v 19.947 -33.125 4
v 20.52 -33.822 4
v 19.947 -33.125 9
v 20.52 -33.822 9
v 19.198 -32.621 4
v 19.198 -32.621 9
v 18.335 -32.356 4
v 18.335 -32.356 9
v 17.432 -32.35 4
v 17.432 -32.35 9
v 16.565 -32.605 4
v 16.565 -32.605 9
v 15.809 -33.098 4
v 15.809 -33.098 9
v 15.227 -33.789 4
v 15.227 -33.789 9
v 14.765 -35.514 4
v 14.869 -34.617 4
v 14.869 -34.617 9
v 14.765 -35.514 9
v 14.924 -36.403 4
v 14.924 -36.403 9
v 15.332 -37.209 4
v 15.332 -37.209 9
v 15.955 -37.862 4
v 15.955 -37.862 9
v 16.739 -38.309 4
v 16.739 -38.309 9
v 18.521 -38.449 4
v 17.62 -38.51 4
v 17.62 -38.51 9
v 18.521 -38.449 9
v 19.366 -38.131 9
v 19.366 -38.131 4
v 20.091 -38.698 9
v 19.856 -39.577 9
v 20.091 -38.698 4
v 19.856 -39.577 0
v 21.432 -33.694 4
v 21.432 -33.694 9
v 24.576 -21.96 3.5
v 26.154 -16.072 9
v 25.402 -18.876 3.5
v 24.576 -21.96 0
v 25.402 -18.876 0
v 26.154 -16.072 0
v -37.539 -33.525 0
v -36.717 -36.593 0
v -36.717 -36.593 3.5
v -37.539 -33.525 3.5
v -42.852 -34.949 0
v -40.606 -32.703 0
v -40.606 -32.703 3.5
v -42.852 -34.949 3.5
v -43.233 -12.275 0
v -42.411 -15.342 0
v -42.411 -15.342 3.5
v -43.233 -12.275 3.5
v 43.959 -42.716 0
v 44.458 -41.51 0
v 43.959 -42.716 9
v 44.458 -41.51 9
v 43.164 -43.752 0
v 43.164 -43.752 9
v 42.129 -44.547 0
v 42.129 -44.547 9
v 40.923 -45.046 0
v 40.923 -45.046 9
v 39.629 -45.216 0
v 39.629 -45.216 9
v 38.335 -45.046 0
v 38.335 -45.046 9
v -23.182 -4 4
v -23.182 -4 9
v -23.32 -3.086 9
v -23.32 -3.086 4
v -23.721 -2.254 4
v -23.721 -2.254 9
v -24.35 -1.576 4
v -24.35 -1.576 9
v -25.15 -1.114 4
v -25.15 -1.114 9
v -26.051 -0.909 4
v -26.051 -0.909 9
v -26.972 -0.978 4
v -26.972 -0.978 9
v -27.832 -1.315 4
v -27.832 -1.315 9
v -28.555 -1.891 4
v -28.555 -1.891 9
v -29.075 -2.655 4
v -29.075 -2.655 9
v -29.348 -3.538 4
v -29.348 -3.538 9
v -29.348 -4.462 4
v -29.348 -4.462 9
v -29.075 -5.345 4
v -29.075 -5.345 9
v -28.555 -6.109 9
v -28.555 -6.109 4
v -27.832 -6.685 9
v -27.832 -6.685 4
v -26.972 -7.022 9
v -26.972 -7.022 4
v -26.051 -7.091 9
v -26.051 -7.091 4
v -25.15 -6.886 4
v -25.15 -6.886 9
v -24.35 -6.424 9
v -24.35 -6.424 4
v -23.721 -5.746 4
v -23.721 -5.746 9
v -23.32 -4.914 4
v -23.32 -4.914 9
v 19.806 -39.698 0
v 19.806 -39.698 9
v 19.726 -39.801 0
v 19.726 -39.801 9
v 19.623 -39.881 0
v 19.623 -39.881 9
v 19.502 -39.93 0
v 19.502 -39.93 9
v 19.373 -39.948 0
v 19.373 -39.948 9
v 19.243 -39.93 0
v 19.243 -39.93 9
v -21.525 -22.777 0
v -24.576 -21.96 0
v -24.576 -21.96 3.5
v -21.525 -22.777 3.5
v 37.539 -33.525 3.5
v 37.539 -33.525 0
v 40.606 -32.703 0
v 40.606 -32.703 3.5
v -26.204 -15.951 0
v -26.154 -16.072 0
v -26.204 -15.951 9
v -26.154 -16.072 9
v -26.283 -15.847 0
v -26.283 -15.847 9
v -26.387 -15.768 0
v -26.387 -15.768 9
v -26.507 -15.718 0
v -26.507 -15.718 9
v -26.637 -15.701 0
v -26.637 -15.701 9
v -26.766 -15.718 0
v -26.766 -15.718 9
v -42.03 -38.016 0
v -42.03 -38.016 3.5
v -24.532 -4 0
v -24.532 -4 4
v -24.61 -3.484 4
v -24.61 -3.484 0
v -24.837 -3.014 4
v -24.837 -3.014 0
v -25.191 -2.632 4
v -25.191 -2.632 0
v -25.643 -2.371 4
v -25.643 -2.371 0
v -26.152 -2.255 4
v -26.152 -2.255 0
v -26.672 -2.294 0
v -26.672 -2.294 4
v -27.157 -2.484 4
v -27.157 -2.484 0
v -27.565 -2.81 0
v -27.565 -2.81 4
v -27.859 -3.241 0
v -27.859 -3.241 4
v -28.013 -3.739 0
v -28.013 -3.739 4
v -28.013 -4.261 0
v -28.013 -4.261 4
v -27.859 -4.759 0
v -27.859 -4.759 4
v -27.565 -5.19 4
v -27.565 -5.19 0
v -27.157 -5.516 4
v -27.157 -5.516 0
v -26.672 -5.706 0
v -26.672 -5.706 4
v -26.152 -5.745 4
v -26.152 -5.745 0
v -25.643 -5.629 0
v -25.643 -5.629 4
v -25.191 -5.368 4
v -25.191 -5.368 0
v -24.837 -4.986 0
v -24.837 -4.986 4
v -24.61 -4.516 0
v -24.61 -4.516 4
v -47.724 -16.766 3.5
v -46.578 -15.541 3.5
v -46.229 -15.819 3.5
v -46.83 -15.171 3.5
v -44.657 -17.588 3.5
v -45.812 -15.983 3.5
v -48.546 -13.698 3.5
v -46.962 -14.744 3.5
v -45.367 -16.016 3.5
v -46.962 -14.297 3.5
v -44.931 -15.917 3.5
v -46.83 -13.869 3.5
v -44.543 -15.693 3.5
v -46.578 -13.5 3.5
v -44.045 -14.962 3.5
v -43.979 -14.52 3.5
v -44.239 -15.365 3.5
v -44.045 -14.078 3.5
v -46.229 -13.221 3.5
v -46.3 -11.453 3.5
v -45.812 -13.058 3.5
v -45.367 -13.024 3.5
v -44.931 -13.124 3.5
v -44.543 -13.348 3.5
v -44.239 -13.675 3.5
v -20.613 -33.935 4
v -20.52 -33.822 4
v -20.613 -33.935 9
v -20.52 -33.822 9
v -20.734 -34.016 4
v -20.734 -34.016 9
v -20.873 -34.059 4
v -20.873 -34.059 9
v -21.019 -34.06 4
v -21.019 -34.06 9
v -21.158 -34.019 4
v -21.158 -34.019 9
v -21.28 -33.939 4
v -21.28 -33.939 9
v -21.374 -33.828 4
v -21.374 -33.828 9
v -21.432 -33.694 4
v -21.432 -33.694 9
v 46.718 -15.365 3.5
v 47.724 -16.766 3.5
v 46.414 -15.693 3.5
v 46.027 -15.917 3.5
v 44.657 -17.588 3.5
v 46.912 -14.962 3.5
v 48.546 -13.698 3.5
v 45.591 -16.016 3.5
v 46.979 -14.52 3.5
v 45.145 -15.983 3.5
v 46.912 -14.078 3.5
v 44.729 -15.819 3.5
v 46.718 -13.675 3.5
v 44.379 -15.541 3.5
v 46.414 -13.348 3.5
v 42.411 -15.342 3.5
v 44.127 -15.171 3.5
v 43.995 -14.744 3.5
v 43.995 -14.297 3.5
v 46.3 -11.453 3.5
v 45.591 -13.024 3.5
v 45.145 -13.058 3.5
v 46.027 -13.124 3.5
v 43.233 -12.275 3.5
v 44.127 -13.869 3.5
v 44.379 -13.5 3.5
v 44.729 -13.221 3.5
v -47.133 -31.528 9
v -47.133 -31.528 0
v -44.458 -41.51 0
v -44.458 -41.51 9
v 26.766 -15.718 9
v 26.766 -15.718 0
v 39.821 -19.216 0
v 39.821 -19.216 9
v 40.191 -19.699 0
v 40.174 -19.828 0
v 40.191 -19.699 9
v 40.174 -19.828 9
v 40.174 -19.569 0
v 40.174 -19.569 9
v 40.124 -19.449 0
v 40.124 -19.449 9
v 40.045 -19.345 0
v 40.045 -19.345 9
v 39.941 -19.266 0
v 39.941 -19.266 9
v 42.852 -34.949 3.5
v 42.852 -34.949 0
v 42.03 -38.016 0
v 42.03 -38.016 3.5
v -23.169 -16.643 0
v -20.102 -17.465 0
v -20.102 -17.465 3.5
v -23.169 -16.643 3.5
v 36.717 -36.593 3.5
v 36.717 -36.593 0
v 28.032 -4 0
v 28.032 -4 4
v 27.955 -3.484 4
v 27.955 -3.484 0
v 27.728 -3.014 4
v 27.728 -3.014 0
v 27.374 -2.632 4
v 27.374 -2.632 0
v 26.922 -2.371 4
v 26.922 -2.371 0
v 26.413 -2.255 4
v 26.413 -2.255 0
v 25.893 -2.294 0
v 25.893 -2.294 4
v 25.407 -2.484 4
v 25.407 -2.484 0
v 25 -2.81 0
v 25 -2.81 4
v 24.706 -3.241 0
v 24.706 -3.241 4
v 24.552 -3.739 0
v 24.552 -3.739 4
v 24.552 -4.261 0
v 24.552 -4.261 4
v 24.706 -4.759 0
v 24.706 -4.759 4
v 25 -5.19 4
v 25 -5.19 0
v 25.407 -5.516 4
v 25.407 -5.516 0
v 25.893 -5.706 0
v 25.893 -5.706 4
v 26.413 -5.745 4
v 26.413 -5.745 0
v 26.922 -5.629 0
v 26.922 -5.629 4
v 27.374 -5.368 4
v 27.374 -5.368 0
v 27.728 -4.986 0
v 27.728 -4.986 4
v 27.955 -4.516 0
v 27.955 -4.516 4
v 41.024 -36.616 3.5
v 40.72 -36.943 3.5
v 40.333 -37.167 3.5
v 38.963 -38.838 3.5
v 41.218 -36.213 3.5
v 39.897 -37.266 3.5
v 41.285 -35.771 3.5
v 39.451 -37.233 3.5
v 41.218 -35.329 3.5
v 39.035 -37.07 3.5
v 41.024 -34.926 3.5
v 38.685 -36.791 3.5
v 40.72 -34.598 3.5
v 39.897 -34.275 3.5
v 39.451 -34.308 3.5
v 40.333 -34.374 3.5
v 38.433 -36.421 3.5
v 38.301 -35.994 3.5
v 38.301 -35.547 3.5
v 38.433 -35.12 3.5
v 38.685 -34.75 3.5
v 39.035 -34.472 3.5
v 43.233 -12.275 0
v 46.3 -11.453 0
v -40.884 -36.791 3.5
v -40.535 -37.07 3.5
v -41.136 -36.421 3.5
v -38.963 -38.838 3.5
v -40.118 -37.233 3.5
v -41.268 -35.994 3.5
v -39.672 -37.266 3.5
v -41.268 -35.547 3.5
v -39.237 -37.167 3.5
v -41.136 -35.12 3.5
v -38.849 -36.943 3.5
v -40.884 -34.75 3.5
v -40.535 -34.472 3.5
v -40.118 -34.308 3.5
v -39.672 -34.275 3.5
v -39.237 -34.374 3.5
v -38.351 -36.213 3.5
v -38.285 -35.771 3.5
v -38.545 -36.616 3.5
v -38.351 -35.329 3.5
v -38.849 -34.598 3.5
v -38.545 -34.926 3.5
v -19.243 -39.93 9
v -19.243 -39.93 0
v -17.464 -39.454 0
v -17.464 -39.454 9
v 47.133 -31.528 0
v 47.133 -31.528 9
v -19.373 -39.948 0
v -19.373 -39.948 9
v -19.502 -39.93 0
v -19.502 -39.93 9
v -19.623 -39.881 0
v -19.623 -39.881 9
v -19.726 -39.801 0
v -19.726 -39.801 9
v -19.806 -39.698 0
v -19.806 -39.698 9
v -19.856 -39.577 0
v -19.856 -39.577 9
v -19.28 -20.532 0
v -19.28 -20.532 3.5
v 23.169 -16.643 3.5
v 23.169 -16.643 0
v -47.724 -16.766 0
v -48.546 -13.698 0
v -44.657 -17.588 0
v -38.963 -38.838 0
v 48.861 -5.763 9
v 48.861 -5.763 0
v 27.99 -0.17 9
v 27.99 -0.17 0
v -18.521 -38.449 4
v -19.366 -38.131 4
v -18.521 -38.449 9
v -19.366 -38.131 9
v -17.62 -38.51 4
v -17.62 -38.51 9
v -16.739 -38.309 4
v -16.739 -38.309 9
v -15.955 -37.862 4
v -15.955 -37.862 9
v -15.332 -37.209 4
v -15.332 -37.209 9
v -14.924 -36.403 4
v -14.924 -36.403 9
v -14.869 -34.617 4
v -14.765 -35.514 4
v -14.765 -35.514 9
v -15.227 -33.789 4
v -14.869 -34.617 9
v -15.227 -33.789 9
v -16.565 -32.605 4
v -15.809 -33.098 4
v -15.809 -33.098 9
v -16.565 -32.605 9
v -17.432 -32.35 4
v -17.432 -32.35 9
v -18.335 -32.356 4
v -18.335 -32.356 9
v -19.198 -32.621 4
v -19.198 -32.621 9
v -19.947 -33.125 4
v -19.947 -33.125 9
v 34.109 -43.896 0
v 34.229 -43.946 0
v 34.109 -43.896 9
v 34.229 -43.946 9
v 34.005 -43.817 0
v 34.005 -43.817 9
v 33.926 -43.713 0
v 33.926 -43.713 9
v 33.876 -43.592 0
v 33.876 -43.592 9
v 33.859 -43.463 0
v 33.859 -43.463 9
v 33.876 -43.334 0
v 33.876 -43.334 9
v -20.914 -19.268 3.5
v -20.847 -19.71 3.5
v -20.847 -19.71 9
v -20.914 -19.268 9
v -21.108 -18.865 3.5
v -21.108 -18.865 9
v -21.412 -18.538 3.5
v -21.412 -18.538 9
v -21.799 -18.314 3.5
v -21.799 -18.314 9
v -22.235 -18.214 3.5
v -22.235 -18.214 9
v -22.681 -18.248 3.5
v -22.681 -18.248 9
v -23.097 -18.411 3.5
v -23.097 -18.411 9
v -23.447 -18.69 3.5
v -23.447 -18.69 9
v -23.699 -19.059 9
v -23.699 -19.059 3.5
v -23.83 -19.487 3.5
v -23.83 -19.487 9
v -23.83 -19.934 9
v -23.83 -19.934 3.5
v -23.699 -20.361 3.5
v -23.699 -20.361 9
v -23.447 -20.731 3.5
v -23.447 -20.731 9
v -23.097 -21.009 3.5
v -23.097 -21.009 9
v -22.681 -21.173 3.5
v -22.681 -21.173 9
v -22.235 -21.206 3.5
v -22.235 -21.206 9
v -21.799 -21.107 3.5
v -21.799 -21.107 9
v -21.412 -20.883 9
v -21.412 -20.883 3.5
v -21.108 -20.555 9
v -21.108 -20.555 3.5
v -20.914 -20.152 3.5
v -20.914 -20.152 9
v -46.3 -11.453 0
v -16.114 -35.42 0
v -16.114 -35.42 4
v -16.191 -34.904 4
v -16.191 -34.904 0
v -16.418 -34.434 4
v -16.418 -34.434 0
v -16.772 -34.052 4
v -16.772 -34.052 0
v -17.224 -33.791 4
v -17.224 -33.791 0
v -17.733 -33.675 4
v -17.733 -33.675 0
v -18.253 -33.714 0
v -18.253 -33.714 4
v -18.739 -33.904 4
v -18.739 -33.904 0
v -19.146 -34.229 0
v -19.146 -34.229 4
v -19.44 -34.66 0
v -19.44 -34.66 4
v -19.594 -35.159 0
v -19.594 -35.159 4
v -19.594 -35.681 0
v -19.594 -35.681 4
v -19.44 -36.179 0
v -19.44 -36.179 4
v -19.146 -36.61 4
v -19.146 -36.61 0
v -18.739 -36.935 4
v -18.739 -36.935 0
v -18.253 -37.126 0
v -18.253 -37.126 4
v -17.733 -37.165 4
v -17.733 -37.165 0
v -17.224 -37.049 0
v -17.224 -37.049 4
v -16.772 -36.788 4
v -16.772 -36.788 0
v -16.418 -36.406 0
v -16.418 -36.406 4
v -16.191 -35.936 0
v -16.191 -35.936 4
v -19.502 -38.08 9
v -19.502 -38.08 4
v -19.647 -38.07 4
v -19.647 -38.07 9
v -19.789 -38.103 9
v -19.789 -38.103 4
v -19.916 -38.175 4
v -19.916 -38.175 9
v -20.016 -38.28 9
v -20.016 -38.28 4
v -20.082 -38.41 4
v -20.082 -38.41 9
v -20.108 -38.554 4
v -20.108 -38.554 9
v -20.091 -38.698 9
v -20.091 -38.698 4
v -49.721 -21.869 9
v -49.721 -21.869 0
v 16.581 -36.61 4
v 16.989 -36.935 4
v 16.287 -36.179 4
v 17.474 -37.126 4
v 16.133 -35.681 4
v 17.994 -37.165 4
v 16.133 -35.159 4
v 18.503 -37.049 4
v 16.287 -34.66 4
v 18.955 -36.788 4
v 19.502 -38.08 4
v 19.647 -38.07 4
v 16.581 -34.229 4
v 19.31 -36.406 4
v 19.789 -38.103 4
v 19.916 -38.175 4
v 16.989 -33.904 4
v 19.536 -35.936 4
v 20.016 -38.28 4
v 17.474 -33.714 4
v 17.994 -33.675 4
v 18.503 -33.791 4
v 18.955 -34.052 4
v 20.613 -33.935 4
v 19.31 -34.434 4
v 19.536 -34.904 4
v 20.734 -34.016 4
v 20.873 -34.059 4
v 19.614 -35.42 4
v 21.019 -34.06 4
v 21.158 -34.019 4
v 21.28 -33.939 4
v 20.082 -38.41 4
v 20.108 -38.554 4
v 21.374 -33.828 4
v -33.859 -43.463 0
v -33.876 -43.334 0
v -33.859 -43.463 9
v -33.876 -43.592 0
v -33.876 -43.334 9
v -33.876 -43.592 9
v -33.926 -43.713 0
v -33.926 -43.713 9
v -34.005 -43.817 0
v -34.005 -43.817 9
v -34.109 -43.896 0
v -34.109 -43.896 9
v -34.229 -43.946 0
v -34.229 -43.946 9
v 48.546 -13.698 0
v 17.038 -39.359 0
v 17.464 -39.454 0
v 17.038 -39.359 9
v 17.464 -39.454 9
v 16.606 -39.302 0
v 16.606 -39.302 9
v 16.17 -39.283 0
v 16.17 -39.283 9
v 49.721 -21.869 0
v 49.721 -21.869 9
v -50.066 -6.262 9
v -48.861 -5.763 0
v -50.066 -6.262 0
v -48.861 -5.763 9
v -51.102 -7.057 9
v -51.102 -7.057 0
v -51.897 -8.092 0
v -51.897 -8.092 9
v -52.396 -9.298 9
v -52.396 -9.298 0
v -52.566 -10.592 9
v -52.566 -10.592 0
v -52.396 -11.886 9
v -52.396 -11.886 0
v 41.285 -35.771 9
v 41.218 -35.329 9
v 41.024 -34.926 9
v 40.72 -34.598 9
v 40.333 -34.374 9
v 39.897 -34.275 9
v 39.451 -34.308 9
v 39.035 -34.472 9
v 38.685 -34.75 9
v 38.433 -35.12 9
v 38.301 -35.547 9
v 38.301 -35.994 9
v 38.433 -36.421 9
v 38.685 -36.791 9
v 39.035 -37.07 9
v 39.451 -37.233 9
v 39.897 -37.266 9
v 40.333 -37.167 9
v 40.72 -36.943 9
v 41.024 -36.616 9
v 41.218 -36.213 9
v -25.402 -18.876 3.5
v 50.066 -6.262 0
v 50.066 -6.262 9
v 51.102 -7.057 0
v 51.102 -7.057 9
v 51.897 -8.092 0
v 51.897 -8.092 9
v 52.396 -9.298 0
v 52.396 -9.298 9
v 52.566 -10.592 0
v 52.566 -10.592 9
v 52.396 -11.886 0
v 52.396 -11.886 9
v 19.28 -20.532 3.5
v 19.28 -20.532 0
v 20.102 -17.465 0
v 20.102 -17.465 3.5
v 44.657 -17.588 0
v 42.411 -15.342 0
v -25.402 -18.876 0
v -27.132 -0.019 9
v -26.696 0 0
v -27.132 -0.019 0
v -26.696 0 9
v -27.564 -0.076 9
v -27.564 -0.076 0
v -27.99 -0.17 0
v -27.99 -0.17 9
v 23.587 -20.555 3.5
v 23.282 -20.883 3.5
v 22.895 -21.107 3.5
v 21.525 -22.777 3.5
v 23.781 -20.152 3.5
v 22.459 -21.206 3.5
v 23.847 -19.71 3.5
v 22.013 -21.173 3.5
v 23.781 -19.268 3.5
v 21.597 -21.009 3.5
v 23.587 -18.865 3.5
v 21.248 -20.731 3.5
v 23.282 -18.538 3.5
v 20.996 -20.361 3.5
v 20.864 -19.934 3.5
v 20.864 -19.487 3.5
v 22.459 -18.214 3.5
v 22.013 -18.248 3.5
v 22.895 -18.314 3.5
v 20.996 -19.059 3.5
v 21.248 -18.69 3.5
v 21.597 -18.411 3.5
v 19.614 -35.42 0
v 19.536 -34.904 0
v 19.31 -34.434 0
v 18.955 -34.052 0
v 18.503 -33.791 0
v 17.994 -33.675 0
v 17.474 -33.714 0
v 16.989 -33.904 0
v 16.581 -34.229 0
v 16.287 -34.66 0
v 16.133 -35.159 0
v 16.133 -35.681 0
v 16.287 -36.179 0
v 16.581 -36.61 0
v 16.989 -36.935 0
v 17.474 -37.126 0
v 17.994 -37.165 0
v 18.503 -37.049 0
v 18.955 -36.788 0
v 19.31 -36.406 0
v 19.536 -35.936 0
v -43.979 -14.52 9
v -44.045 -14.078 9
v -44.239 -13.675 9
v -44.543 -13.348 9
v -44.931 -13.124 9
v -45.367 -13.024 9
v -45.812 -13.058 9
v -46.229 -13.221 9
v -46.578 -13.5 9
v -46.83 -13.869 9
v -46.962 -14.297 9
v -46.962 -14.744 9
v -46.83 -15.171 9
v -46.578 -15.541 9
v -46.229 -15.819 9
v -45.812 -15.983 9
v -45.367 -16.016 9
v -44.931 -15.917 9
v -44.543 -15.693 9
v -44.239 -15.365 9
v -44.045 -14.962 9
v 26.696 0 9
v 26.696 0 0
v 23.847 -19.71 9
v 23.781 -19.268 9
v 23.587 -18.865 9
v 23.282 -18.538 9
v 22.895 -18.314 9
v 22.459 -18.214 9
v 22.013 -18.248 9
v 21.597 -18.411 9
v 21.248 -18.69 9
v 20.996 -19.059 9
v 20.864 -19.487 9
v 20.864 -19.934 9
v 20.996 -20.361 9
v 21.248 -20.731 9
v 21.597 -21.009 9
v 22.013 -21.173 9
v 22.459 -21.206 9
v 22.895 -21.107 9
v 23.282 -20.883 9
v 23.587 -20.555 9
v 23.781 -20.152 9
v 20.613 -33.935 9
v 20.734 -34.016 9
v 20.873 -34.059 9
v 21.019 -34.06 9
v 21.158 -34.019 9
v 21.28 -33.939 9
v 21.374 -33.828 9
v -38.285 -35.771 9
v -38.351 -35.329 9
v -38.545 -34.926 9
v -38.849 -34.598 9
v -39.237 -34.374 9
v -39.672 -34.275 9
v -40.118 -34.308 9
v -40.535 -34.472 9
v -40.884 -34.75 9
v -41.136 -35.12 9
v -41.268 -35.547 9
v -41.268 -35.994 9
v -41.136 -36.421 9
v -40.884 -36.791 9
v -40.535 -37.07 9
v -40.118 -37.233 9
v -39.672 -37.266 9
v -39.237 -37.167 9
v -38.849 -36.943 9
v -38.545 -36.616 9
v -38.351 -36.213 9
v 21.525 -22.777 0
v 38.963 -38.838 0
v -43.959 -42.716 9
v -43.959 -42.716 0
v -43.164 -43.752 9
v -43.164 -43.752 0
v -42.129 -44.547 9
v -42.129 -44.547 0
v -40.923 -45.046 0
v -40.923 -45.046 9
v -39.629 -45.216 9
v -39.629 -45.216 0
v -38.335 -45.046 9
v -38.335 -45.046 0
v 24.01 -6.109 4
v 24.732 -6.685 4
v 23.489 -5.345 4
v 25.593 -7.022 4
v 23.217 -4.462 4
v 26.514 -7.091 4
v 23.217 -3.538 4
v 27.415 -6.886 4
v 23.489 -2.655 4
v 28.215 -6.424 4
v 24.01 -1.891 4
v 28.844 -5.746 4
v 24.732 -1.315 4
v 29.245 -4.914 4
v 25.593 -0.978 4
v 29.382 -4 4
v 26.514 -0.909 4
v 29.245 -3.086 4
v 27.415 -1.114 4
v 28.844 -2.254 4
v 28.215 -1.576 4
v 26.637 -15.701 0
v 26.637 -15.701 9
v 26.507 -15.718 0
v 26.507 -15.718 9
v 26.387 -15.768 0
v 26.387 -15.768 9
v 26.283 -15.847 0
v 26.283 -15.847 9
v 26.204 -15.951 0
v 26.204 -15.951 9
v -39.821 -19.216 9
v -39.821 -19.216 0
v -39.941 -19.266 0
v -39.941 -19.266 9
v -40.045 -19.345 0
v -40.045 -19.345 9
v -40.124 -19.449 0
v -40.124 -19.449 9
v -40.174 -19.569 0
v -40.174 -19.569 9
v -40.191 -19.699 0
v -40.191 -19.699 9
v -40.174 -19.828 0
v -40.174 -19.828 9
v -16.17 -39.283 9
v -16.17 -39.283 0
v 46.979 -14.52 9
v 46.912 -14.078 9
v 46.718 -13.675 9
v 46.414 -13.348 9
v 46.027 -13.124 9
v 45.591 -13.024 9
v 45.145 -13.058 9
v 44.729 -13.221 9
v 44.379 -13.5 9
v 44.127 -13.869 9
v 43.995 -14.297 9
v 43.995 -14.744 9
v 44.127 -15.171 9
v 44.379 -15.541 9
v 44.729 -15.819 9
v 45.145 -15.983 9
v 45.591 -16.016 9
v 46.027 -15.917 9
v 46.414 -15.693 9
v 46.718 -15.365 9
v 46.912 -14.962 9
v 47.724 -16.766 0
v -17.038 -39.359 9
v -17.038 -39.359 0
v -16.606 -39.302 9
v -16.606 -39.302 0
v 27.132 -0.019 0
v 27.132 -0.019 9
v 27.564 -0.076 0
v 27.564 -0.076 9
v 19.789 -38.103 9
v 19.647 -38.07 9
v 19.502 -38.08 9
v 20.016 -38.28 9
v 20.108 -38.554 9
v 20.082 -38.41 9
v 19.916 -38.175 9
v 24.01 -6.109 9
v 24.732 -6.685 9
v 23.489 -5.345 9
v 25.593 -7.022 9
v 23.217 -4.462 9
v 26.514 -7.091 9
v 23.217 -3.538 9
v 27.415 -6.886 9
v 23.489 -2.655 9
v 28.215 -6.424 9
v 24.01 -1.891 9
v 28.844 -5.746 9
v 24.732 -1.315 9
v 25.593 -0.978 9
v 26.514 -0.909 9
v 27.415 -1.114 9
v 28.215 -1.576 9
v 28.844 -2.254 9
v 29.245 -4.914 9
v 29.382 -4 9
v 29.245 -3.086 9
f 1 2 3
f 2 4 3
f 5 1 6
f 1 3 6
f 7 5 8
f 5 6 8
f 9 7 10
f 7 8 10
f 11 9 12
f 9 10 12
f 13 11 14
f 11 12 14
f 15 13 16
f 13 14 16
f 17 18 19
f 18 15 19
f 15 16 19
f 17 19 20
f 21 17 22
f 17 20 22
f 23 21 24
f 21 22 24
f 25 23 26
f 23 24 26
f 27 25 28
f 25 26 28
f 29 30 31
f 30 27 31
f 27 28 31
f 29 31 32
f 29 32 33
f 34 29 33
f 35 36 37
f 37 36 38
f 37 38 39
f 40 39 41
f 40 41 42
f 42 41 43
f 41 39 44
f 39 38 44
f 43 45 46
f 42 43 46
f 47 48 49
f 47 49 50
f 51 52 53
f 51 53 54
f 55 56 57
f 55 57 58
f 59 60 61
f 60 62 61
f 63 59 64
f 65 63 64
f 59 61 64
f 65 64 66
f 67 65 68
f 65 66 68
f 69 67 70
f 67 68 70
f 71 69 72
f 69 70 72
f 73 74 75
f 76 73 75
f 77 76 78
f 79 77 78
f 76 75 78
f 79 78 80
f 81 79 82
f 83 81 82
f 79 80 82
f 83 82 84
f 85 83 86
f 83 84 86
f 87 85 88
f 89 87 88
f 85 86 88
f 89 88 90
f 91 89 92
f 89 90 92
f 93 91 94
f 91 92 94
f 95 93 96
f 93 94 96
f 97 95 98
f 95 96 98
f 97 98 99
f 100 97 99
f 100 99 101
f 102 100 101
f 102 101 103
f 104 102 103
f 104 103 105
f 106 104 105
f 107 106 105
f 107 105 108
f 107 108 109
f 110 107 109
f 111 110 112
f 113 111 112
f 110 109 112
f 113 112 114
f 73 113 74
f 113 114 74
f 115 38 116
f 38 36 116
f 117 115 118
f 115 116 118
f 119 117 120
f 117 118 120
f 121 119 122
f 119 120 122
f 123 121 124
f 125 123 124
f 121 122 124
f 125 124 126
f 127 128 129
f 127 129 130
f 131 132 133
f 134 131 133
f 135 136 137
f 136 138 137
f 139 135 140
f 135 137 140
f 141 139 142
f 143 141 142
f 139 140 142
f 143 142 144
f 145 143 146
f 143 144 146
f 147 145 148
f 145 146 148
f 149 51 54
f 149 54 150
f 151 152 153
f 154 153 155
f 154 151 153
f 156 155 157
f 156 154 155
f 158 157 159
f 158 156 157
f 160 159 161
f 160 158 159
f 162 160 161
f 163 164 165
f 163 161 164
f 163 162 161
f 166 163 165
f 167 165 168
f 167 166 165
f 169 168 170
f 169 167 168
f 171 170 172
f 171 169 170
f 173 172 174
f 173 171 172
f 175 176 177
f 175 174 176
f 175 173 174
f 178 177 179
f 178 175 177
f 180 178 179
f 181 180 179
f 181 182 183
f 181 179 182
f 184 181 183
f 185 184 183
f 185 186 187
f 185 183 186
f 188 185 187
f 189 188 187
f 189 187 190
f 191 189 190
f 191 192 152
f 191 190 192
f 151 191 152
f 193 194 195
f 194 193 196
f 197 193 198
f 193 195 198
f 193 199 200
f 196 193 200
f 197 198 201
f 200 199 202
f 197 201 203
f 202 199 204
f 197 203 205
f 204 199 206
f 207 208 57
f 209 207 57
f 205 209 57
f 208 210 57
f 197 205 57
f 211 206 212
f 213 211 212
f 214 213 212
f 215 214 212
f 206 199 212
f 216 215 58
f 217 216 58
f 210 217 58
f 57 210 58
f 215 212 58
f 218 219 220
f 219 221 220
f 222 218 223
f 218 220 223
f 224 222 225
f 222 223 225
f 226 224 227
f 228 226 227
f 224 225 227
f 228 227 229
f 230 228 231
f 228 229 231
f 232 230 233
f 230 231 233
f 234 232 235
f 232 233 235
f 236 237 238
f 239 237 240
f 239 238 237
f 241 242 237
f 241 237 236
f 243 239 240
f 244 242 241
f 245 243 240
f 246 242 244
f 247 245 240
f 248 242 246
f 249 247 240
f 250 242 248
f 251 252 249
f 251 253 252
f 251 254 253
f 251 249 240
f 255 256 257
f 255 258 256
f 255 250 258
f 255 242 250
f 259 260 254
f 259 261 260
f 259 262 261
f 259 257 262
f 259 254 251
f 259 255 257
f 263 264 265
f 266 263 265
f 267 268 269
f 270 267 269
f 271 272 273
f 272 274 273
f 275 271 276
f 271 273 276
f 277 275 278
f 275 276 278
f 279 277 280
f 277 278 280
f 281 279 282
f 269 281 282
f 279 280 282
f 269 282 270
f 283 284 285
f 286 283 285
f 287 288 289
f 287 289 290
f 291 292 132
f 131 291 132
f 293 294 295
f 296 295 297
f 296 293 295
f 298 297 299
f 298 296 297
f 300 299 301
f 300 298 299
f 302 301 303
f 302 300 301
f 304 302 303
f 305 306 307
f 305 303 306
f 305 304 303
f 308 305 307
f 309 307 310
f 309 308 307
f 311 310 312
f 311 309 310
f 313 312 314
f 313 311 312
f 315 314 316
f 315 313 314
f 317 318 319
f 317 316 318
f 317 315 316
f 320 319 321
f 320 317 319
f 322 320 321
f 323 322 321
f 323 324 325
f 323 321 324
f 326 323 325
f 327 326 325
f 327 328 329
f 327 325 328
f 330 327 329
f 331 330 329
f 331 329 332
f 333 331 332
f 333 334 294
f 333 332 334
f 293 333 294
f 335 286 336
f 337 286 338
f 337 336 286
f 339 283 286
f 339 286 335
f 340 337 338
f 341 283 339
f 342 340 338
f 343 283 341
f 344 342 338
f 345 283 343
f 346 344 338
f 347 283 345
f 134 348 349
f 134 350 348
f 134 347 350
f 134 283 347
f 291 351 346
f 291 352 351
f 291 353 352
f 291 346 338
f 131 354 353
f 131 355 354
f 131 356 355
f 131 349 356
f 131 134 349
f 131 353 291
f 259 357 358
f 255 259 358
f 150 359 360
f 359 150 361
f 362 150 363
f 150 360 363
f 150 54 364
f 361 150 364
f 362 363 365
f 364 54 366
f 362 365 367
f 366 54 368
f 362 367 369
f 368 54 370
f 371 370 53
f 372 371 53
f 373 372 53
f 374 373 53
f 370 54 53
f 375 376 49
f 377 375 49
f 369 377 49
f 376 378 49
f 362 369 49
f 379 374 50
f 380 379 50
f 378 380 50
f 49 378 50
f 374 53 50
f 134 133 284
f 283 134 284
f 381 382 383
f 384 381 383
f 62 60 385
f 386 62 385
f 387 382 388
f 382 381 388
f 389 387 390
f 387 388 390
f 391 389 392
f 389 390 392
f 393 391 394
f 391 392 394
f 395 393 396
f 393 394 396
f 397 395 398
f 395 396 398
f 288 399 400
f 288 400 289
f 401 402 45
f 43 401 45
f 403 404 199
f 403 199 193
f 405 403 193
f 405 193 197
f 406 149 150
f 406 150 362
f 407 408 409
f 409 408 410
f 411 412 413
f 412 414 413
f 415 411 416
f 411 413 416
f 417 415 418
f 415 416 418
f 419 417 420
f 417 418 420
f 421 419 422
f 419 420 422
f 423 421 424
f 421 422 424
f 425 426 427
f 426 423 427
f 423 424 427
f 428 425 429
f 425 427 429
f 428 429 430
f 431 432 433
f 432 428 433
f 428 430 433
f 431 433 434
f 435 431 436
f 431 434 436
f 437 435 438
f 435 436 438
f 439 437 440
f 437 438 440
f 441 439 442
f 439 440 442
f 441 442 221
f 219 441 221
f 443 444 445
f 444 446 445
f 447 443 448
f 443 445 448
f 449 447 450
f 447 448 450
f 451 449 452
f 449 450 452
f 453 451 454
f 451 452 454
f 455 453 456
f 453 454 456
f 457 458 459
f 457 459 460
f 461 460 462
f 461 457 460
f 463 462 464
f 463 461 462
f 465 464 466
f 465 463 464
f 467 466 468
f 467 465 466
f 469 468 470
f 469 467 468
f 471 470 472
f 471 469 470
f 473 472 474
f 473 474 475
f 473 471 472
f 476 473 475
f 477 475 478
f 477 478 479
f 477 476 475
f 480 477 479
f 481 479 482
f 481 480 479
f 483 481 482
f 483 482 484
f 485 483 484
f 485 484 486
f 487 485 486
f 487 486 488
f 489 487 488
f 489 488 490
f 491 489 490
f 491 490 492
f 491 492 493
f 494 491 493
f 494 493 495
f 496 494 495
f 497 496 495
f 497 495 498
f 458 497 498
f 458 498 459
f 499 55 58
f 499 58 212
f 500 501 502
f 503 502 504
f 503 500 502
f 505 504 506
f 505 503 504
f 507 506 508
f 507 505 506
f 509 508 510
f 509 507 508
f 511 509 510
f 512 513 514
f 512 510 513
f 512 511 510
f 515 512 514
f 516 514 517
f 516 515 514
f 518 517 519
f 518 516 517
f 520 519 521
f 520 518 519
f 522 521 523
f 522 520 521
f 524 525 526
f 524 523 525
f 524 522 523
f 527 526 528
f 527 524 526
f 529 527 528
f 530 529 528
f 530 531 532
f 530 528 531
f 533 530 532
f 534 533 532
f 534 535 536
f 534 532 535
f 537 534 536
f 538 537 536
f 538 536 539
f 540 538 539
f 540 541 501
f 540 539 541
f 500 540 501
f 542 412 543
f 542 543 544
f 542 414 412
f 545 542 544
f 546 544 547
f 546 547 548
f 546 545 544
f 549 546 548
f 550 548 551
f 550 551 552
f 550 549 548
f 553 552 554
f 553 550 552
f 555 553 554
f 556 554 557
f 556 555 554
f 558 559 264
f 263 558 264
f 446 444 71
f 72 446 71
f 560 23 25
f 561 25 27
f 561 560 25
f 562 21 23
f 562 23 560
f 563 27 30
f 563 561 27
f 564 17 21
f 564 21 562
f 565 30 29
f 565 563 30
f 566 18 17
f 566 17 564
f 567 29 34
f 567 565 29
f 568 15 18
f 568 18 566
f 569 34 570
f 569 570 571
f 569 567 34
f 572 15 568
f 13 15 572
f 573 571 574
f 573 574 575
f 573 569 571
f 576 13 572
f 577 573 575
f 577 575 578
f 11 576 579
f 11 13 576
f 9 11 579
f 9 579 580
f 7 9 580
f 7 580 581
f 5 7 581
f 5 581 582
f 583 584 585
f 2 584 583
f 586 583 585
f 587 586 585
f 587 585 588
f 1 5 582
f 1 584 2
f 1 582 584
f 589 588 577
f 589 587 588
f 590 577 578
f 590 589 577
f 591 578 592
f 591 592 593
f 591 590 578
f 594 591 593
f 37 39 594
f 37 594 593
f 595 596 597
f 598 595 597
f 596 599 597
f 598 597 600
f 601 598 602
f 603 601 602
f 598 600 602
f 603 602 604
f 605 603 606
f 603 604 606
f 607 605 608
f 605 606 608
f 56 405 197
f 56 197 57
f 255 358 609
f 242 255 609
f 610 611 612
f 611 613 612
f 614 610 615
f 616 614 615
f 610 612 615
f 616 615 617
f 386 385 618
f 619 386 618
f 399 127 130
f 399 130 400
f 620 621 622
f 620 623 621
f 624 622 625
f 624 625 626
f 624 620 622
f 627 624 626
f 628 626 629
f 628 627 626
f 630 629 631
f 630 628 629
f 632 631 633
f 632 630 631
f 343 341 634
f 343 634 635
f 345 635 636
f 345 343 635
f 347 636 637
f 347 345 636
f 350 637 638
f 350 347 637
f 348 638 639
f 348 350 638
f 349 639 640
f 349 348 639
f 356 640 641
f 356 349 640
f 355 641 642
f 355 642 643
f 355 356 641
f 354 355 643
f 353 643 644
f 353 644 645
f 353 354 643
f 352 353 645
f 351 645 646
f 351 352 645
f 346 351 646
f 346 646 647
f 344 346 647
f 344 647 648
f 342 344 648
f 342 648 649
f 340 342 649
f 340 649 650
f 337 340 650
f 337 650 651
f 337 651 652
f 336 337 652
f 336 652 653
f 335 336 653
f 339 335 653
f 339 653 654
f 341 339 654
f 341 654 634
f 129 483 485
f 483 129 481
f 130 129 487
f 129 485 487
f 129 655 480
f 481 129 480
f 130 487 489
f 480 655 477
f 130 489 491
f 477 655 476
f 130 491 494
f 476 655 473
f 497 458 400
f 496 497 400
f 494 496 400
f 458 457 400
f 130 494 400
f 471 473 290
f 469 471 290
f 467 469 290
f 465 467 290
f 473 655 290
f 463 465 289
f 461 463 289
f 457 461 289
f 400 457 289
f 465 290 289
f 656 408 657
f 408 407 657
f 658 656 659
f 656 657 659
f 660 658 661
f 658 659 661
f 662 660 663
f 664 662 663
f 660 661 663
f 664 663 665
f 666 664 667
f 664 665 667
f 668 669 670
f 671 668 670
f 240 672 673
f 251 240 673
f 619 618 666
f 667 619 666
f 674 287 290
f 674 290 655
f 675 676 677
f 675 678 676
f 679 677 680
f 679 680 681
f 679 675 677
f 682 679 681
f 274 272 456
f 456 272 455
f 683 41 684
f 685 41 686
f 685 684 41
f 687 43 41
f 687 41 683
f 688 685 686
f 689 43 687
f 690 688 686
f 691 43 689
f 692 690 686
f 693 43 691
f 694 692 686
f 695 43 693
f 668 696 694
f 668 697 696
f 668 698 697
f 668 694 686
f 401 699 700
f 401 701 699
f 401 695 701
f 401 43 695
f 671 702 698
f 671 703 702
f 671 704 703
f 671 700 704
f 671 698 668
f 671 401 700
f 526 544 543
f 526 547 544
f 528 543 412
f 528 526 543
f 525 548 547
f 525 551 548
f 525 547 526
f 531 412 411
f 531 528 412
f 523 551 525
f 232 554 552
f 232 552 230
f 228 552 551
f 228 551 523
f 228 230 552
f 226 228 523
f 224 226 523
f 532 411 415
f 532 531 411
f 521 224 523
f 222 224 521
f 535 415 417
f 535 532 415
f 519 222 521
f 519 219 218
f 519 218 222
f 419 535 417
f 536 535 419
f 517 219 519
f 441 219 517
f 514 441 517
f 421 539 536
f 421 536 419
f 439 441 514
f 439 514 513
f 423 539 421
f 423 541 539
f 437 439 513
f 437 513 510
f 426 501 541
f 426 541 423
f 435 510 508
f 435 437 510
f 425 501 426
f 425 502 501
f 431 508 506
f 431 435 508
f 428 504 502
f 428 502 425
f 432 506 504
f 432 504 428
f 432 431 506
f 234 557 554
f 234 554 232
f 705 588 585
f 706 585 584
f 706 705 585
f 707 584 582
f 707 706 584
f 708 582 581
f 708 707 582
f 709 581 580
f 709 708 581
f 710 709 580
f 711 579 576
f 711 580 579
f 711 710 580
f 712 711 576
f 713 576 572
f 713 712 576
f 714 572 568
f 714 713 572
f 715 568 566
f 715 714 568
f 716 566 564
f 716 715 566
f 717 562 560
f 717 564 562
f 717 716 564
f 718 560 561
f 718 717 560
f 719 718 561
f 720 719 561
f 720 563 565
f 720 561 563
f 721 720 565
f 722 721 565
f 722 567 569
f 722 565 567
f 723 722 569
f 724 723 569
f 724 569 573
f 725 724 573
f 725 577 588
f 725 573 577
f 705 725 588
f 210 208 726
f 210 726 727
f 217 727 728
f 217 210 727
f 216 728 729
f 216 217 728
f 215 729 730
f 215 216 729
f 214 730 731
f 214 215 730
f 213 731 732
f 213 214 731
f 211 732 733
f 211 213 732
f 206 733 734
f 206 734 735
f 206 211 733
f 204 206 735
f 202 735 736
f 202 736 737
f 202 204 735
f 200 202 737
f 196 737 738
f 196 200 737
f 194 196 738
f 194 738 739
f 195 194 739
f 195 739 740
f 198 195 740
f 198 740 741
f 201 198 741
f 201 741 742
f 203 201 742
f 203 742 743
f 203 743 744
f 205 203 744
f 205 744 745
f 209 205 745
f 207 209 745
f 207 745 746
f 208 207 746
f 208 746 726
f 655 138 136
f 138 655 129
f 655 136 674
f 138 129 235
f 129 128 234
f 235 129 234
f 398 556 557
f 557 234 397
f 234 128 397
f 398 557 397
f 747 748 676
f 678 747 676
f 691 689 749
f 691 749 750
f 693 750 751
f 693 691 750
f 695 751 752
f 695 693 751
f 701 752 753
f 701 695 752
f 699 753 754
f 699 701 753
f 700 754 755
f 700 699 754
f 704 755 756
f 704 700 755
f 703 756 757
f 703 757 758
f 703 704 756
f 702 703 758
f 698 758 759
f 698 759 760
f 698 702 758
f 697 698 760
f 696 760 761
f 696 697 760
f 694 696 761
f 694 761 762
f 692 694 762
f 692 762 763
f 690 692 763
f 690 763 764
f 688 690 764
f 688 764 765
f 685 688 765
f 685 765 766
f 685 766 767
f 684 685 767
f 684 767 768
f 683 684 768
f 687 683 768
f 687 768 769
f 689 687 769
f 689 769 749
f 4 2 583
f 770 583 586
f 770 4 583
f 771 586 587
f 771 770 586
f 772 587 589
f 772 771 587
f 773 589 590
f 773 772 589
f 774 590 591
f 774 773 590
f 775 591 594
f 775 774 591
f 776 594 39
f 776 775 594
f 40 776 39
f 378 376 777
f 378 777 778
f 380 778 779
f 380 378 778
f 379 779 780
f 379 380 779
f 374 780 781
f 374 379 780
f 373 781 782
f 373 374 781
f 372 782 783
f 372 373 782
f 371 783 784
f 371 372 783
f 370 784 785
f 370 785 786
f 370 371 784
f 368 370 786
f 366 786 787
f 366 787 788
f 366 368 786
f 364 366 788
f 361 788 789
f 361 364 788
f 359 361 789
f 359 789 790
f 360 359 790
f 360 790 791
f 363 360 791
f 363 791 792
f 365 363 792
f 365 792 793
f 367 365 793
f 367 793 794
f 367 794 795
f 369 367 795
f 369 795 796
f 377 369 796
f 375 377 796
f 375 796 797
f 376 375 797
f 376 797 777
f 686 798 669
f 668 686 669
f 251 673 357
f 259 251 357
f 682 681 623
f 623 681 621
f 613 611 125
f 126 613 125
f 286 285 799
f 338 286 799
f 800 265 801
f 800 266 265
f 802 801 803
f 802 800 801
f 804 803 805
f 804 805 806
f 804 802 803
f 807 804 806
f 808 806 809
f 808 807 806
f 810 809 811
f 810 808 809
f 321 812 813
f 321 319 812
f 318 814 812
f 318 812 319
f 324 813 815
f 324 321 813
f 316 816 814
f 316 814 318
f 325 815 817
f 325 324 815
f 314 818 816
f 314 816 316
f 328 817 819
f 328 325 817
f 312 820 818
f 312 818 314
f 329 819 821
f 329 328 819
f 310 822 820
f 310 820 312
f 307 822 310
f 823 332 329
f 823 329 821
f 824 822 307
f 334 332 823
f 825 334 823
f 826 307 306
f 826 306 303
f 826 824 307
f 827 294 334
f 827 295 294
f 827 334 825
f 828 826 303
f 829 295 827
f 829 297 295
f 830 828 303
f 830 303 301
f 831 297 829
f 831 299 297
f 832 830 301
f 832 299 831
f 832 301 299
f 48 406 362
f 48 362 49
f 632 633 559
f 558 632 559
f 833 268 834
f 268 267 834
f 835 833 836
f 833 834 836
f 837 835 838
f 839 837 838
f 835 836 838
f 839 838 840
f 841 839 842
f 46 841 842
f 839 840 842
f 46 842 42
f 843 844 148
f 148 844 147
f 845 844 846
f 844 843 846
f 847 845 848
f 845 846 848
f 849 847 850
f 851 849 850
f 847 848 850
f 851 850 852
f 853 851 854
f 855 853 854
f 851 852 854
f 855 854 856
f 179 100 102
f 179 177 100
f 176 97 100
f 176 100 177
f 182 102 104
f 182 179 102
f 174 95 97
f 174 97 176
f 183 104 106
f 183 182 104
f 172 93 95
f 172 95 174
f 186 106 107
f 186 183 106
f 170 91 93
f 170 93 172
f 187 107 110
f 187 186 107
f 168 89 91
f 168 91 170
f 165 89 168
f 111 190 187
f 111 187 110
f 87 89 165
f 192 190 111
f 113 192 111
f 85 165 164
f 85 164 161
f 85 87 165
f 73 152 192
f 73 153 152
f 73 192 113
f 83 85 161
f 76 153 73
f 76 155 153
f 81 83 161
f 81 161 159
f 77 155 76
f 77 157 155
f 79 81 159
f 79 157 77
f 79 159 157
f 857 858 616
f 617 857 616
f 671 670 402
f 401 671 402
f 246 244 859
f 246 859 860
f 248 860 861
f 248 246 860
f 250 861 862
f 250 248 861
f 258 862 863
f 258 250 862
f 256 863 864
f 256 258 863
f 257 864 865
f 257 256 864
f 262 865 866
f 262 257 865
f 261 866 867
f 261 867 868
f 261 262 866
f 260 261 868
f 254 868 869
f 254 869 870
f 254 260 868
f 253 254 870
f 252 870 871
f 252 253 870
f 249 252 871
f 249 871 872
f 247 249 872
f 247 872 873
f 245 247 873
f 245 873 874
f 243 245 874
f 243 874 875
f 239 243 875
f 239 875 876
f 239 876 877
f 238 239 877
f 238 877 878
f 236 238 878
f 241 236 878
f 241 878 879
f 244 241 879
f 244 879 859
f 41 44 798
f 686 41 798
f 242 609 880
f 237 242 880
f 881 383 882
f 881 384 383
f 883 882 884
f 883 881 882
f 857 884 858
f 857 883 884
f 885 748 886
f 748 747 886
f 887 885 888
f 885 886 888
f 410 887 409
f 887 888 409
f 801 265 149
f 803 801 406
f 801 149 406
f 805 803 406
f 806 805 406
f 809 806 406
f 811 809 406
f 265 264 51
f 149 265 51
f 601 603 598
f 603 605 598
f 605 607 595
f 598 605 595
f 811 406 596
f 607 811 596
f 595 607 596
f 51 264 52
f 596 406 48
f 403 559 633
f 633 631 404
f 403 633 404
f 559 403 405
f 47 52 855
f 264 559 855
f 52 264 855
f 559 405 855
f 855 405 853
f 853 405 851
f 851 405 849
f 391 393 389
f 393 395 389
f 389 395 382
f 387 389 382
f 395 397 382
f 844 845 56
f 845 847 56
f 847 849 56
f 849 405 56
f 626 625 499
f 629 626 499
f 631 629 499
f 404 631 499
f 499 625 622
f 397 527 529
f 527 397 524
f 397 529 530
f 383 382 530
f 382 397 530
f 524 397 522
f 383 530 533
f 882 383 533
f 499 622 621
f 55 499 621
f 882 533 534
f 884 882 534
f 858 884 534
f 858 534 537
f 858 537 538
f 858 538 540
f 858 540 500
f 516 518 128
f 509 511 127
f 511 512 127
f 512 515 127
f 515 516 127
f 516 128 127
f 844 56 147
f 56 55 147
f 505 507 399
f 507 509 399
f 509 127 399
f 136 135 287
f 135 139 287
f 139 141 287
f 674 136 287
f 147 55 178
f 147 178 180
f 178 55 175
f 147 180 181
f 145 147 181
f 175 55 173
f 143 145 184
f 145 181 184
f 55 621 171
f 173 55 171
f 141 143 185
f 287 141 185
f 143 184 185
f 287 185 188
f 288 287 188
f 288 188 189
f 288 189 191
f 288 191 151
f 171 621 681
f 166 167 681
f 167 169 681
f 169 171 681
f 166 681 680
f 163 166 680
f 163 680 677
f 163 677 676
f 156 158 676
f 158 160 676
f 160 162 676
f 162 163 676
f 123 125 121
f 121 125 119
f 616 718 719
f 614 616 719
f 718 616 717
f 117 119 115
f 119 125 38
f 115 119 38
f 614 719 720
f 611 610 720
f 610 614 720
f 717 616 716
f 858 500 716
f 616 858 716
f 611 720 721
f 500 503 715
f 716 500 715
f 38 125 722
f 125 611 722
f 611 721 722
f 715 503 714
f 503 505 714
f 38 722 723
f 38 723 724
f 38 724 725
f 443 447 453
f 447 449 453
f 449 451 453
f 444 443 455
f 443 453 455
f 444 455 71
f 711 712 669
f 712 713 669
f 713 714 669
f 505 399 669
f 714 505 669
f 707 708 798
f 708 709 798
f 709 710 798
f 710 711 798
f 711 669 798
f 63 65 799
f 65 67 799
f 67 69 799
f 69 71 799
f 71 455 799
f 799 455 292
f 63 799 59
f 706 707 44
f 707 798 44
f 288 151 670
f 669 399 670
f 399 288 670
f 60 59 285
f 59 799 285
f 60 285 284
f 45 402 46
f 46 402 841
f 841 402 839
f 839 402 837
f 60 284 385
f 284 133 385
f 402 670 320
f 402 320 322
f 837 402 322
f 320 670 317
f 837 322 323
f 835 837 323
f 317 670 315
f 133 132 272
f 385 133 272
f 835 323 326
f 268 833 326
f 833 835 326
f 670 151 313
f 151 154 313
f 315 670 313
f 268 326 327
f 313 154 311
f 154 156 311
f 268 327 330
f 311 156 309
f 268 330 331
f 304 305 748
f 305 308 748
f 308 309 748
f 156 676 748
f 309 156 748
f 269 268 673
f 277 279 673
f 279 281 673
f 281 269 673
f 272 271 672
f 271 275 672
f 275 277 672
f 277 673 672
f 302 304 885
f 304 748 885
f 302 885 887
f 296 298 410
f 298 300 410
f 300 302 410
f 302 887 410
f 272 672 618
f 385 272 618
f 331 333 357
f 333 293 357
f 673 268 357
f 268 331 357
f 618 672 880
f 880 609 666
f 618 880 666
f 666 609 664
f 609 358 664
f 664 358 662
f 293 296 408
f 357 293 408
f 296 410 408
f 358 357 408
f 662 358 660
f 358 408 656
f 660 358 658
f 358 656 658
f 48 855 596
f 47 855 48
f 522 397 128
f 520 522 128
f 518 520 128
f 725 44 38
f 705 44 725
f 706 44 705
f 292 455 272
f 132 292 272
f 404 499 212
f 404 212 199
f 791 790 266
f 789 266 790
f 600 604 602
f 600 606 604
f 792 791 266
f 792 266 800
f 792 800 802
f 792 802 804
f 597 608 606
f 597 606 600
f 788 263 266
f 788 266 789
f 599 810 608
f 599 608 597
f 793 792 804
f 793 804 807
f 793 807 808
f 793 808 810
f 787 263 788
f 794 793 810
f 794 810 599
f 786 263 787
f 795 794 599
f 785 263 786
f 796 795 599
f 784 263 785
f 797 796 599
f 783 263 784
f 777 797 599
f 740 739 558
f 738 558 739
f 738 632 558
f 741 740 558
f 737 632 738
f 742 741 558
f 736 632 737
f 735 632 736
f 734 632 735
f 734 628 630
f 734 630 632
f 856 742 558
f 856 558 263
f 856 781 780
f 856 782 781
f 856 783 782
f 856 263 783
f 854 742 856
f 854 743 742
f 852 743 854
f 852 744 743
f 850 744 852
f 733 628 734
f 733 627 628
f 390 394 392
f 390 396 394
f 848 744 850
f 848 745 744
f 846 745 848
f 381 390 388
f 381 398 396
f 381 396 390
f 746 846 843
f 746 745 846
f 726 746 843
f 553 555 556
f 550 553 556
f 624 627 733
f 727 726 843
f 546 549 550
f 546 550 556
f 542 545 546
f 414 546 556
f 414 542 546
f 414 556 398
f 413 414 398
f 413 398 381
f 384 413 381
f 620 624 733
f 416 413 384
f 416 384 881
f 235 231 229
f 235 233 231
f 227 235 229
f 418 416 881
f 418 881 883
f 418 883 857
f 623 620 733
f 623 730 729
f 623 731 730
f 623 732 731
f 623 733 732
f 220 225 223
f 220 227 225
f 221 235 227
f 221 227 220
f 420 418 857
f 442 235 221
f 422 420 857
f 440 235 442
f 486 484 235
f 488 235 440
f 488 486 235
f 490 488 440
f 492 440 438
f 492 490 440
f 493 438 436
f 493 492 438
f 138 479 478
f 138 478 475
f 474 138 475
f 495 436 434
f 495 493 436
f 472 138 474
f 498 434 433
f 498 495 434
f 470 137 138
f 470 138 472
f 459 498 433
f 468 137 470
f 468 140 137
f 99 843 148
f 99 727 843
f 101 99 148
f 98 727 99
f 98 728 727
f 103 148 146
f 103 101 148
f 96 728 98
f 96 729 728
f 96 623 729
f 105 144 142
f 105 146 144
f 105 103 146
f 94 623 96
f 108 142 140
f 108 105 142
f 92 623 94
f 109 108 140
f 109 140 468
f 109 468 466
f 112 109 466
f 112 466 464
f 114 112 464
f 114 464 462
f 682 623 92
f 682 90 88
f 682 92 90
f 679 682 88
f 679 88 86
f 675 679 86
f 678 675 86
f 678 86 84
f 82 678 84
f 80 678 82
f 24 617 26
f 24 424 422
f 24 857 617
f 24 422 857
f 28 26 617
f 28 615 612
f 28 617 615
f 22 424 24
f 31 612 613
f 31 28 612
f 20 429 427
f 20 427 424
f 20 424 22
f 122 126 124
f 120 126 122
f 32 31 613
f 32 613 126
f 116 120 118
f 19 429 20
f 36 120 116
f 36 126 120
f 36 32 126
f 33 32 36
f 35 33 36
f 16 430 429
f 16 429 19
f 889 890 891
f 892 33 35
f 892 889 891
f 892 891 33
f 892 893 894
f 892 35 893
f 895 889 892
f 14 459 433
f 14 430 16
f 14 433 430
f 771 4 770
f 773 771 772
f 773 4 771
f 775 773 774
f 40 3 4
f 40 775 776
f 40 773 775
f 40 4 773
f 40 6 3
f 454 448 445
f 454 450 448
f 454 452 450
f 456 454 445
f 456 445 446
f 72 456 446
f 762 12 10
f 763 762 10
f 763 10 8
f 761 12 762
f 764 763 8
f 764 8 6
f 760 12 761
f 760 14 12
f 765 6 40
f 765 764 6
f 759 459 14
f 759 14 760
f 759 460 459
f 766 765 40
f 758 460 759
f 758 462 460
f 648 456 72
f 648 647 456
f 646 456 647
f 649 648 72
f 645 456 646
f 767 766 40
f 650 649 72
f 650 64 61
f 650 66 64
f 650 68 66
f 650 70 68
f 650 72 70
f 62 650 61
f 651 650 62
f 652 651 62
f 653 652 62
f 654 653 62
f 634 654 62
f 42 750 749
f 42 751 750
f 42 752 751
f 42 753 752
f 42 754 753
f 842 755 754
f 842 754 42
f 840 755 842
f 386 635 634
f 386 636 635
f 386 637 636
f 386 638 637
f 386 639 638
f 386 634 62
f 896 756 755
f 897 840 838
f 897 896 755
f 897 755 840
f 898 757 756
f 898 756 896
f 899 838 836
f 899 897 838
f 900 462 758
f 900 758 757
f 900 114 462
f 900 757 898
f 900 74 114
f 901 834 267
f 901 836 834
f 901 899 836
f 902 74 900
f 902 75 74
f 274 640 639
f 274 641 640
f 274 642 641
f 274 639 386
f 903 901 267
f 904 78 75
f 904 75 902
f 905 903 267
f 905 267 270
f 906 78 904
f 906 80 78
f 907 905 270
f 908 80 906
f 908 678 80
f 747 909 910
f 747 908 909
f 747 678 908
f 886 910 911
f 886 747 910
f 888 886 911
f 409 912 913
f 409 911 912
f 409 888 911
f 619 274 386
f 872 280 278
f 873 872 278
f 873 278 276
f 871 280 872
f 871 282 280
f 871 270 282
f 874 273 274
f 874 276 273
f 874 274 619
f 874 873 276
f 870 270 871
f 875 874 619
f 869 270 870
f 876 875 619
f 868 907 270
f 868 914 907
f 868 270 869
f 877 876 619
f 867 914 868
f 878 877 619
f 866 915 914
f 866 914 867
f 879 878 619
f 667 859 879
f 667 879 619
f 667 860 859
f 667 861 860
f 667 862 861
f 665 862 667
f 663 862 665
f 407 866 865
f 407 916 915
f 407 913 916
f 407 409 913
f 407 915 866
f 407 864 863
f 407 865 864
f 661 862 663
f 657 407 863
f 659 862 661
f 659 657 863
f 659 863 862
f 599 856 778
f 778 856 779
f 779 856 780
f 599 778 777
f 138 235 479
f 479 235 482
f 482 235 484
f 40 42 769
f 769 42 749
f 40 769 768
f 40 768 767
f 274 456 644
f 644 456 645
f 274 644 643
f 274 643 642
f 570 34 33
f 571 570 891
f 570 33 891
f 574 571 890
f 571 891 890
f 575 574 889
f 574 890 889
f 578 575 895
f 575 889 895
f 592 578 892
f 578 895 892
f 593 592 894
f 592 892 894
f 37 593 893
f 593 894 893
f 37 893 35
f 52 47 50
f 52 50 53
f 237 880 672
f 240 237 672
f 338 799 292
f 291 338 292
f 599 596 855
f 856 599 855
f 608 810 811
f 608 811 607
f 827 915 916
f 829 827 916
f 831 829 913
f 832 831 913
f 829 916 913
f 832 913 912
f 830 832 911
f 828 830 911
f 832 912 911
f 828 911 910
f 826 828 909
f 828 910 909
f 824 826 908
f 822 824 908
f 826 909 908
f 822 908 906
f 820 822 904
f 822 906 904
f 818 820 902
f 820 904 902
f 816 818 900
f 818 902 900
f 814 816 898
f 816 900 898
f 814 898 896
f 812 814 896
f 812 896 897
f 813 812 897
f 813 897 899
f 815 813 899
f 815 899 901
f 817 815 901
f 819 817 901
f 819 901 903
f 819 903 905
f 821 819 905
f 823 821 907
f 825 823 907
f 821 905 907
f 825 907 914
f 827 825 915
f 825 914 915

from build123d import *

# Parameters (mm, degrees)
SKETCH_1_R          = 1.5
SKETCH_1_R_2        = 1.75
EXTRUDE_1_DEPTH     = 9
FILLET_1_R          = 5
CUT_EXTRUDE_1_DEPTH = 3.5
SKETCH_5_R          = 3.1
CUT_EXTRUDE_2_DEPTH = 5
FILLET_2_R          = 0.5


with BuildPart() as part:
    # 草图1 → 凸台-拉伸1 (new body)
    with BuildSketch(Plane.XY):
        Polygon((27.354279807, 0), (-27.354279807, 0), (-53.690131677, -7.056670241), (-49.721245605, -21.868754713), (-47.133055154, -31.528012976), (-43.164169081, -46.340097448), (-33.746392275, -43.816611758), (-40.303468798, -19.345269023), (-26.283171214, -15.588541608), (-19.72609469, -40.059884343), (-16.828317211, -39.283427207), (16.828317211, -39.283427207), (19.72609469, -40.059884343), (26.283171214, -15.588541608), (40.303468798, -19.345269023), (33.746392275, -43.816611758), (43.164169081, -46.340097448), (47.133055154, -31.528012976), (49.721245605, -21.868754713), (53.690131677, -7.056670241), align=None)
        with Locations((-39.784585925, -35.770653663)):
            Circle(SKETCH_1_R, mode=Mode.SUBTRACT)
        with Locations((-17.863593392, -35.419723902)):
            Circle(SKETCH_1_R_2, mode=Mode.SUBTRACT)
        with Locations((17.863593392, -35.419723902)):
            Circle(SKETCH_1_R_2, mode=Mode.SUBTRACT)
        with Locations((39.784585925, -35.770653663)):
            Circle(SKETCH_1_R, mode=Mode.SUBTRACT)
        with Locations((-45.478604918, -14.520285484)):
            Circle(SKETCH_1_R, mode=Mode.SUBTRACT)
        with Locations((-22.347153069, -19.710269626)):
            Circle(SKETCH_1_R, mode=Mode.SUBTRACT)
        with Locations((-26.282483038, -4)):
            Circle(SKETCH_1_R_2, mode=Mode.SUBTRACT)
        with Locations((22.347153069, -19.710269626)):
            Circle(SKETCH_1_R, mode=Mode.SUBTRACT)
        with Locations((45.478604918, -14.520285484)):
            Circle(SKETCH_1_R, mode=Mode.SUBTRACT)
        with Locations((26.282483038, -4)):
            Circle(SKETCH_1_R_2, mode=Mode.SUBTRACT)
    extrude(amount=EXTRUDE_1_DEPTH)

    # 圆角1
    fillet_1_edges = [part.edges().sort_by_distance(p)[0] for p in [
        (16.828317211, -39.283427207, 4.5),
        (-16.828317211, -39.283427207, 4.5),
        (-43.164169081, -46.340097448, 4.5),
        (-53.690131677, -7.056670241, 4.5),
        (-27.354279807, 0, 4.5),
        (27.354279807, 0, 4.5),
        (53.690131677, -7.056670241, 4.5),
        (43.164169081, -46.340097448, 4.5),
    ]]
    fillet(fillet_1_edges, radius=FILLET_1_R)

    # 草图2 → 切除-拉伸1 (cut)
    with BuildSketch(Plane(origin=(0, 0, 0), x_dir=(-1, 0, 0), z_dir=(0, 0, -1))):
        Polygon((-42.411378471, -15.342146334), (-43.23323932, -12.274919887), (-46.300465767, -11.453059037), (-48.545831365, -13.698424635), (-47.723970515, -16.765651082), (-44.656744068, -17.587511931), align=None)
        Polygon((-21.52529222, -22.777496073), (-19.279926622, -20.532130476), (-20.101787472, -17.464904029), (-23.169013919, -16.643043179), (-25.414379516, -18.888408777), (-24.592518667, -21.955635224), align=None)
        Polygon((-36.717359478, -36.592514512), (-37.539220328, -33.525288065), (-40.606446775, -32.703427216), (-42.851812372, -34.948792813), (-42.029951523, -38.01601926), (-38.962725076, -38.83788011), align=None)
        Polygon((38.962725076, -38.83788011), (36.717359478, -36.592514512), (37.539220328, -33.525288065), (40.606446775, -32.703427216), (42.851812372, -34.948792813), (42.029951523, -38.01601926), align=None)
        Polygon((24.592518667, -21.955635224), (21.52529222, -22.777496073), (19.279926622, -20.532130476), (20.101787472, -17.464904029), (23.169013919, -16.643043179), (25.414379516, -18.888408777), align=None)
        Polygon((44.656744068, -17.587511931), (42.411378471, -15.342146334), (43.23323932, -12.274919887), (46.300465767, -11.453059037), (48.545831365, -13.698424635), (47.723970515, -16.765651082), align=None)
    extrude(amount=-CUT_EXTRUDE_1_DEPTH, mode=Mode.SUBTRACT)

    # 草图5 → 切除-拉伸2 (cut)
    with BuildSketch(Plane.XY.offset(9)):
        with Locations((-26.282483038, -4)):
            Circle(SKETCH_5_R)
        with Locations((-17.863593392, -35.419723902)):
            Circle(SKETCH_5_R)
        with Locations((17.863593392, -35.419723902)):
            Circle(SKETCH_5_R)
        with Locations((26.282483038, -4)):
            Circle(SKETCH_5_R)
    extrude(amount=-CUT_EXTRUDE_2_DEPTH, mode=Mode.SUBTRACT)

    # 圆角2
    fillet_2_edges = [part.edges().sort_by_distance(p)[0] for p in [
        (-20.963515007, -35.44176885, 6.5),
        (-20.559226734, -36.950593225, 6.5),
        (20.963515007, -35.44176885, 6.5),
        (20.559226734, -36.950593225, 6.5),
        (19.72609469, -40.059884343, 4.5),
        (-19.72609469, -40.059884343, 4.5),
        (-26.283171214, -15.588541608, 4.5),
        (-40.303468798, -19.345269023, 4.5),
        (-33.746392275, -43.816611758, 4.5),
        (33.746392275, -43.816611758, 4.5),
        (40.303468798, -19.345269023, 4.5),
        (26.283171214, -15.588541608, 4.5),
    ]]
    fillet(fillet_2_edges, radius=FILLET_2_R)


solid = part.part
